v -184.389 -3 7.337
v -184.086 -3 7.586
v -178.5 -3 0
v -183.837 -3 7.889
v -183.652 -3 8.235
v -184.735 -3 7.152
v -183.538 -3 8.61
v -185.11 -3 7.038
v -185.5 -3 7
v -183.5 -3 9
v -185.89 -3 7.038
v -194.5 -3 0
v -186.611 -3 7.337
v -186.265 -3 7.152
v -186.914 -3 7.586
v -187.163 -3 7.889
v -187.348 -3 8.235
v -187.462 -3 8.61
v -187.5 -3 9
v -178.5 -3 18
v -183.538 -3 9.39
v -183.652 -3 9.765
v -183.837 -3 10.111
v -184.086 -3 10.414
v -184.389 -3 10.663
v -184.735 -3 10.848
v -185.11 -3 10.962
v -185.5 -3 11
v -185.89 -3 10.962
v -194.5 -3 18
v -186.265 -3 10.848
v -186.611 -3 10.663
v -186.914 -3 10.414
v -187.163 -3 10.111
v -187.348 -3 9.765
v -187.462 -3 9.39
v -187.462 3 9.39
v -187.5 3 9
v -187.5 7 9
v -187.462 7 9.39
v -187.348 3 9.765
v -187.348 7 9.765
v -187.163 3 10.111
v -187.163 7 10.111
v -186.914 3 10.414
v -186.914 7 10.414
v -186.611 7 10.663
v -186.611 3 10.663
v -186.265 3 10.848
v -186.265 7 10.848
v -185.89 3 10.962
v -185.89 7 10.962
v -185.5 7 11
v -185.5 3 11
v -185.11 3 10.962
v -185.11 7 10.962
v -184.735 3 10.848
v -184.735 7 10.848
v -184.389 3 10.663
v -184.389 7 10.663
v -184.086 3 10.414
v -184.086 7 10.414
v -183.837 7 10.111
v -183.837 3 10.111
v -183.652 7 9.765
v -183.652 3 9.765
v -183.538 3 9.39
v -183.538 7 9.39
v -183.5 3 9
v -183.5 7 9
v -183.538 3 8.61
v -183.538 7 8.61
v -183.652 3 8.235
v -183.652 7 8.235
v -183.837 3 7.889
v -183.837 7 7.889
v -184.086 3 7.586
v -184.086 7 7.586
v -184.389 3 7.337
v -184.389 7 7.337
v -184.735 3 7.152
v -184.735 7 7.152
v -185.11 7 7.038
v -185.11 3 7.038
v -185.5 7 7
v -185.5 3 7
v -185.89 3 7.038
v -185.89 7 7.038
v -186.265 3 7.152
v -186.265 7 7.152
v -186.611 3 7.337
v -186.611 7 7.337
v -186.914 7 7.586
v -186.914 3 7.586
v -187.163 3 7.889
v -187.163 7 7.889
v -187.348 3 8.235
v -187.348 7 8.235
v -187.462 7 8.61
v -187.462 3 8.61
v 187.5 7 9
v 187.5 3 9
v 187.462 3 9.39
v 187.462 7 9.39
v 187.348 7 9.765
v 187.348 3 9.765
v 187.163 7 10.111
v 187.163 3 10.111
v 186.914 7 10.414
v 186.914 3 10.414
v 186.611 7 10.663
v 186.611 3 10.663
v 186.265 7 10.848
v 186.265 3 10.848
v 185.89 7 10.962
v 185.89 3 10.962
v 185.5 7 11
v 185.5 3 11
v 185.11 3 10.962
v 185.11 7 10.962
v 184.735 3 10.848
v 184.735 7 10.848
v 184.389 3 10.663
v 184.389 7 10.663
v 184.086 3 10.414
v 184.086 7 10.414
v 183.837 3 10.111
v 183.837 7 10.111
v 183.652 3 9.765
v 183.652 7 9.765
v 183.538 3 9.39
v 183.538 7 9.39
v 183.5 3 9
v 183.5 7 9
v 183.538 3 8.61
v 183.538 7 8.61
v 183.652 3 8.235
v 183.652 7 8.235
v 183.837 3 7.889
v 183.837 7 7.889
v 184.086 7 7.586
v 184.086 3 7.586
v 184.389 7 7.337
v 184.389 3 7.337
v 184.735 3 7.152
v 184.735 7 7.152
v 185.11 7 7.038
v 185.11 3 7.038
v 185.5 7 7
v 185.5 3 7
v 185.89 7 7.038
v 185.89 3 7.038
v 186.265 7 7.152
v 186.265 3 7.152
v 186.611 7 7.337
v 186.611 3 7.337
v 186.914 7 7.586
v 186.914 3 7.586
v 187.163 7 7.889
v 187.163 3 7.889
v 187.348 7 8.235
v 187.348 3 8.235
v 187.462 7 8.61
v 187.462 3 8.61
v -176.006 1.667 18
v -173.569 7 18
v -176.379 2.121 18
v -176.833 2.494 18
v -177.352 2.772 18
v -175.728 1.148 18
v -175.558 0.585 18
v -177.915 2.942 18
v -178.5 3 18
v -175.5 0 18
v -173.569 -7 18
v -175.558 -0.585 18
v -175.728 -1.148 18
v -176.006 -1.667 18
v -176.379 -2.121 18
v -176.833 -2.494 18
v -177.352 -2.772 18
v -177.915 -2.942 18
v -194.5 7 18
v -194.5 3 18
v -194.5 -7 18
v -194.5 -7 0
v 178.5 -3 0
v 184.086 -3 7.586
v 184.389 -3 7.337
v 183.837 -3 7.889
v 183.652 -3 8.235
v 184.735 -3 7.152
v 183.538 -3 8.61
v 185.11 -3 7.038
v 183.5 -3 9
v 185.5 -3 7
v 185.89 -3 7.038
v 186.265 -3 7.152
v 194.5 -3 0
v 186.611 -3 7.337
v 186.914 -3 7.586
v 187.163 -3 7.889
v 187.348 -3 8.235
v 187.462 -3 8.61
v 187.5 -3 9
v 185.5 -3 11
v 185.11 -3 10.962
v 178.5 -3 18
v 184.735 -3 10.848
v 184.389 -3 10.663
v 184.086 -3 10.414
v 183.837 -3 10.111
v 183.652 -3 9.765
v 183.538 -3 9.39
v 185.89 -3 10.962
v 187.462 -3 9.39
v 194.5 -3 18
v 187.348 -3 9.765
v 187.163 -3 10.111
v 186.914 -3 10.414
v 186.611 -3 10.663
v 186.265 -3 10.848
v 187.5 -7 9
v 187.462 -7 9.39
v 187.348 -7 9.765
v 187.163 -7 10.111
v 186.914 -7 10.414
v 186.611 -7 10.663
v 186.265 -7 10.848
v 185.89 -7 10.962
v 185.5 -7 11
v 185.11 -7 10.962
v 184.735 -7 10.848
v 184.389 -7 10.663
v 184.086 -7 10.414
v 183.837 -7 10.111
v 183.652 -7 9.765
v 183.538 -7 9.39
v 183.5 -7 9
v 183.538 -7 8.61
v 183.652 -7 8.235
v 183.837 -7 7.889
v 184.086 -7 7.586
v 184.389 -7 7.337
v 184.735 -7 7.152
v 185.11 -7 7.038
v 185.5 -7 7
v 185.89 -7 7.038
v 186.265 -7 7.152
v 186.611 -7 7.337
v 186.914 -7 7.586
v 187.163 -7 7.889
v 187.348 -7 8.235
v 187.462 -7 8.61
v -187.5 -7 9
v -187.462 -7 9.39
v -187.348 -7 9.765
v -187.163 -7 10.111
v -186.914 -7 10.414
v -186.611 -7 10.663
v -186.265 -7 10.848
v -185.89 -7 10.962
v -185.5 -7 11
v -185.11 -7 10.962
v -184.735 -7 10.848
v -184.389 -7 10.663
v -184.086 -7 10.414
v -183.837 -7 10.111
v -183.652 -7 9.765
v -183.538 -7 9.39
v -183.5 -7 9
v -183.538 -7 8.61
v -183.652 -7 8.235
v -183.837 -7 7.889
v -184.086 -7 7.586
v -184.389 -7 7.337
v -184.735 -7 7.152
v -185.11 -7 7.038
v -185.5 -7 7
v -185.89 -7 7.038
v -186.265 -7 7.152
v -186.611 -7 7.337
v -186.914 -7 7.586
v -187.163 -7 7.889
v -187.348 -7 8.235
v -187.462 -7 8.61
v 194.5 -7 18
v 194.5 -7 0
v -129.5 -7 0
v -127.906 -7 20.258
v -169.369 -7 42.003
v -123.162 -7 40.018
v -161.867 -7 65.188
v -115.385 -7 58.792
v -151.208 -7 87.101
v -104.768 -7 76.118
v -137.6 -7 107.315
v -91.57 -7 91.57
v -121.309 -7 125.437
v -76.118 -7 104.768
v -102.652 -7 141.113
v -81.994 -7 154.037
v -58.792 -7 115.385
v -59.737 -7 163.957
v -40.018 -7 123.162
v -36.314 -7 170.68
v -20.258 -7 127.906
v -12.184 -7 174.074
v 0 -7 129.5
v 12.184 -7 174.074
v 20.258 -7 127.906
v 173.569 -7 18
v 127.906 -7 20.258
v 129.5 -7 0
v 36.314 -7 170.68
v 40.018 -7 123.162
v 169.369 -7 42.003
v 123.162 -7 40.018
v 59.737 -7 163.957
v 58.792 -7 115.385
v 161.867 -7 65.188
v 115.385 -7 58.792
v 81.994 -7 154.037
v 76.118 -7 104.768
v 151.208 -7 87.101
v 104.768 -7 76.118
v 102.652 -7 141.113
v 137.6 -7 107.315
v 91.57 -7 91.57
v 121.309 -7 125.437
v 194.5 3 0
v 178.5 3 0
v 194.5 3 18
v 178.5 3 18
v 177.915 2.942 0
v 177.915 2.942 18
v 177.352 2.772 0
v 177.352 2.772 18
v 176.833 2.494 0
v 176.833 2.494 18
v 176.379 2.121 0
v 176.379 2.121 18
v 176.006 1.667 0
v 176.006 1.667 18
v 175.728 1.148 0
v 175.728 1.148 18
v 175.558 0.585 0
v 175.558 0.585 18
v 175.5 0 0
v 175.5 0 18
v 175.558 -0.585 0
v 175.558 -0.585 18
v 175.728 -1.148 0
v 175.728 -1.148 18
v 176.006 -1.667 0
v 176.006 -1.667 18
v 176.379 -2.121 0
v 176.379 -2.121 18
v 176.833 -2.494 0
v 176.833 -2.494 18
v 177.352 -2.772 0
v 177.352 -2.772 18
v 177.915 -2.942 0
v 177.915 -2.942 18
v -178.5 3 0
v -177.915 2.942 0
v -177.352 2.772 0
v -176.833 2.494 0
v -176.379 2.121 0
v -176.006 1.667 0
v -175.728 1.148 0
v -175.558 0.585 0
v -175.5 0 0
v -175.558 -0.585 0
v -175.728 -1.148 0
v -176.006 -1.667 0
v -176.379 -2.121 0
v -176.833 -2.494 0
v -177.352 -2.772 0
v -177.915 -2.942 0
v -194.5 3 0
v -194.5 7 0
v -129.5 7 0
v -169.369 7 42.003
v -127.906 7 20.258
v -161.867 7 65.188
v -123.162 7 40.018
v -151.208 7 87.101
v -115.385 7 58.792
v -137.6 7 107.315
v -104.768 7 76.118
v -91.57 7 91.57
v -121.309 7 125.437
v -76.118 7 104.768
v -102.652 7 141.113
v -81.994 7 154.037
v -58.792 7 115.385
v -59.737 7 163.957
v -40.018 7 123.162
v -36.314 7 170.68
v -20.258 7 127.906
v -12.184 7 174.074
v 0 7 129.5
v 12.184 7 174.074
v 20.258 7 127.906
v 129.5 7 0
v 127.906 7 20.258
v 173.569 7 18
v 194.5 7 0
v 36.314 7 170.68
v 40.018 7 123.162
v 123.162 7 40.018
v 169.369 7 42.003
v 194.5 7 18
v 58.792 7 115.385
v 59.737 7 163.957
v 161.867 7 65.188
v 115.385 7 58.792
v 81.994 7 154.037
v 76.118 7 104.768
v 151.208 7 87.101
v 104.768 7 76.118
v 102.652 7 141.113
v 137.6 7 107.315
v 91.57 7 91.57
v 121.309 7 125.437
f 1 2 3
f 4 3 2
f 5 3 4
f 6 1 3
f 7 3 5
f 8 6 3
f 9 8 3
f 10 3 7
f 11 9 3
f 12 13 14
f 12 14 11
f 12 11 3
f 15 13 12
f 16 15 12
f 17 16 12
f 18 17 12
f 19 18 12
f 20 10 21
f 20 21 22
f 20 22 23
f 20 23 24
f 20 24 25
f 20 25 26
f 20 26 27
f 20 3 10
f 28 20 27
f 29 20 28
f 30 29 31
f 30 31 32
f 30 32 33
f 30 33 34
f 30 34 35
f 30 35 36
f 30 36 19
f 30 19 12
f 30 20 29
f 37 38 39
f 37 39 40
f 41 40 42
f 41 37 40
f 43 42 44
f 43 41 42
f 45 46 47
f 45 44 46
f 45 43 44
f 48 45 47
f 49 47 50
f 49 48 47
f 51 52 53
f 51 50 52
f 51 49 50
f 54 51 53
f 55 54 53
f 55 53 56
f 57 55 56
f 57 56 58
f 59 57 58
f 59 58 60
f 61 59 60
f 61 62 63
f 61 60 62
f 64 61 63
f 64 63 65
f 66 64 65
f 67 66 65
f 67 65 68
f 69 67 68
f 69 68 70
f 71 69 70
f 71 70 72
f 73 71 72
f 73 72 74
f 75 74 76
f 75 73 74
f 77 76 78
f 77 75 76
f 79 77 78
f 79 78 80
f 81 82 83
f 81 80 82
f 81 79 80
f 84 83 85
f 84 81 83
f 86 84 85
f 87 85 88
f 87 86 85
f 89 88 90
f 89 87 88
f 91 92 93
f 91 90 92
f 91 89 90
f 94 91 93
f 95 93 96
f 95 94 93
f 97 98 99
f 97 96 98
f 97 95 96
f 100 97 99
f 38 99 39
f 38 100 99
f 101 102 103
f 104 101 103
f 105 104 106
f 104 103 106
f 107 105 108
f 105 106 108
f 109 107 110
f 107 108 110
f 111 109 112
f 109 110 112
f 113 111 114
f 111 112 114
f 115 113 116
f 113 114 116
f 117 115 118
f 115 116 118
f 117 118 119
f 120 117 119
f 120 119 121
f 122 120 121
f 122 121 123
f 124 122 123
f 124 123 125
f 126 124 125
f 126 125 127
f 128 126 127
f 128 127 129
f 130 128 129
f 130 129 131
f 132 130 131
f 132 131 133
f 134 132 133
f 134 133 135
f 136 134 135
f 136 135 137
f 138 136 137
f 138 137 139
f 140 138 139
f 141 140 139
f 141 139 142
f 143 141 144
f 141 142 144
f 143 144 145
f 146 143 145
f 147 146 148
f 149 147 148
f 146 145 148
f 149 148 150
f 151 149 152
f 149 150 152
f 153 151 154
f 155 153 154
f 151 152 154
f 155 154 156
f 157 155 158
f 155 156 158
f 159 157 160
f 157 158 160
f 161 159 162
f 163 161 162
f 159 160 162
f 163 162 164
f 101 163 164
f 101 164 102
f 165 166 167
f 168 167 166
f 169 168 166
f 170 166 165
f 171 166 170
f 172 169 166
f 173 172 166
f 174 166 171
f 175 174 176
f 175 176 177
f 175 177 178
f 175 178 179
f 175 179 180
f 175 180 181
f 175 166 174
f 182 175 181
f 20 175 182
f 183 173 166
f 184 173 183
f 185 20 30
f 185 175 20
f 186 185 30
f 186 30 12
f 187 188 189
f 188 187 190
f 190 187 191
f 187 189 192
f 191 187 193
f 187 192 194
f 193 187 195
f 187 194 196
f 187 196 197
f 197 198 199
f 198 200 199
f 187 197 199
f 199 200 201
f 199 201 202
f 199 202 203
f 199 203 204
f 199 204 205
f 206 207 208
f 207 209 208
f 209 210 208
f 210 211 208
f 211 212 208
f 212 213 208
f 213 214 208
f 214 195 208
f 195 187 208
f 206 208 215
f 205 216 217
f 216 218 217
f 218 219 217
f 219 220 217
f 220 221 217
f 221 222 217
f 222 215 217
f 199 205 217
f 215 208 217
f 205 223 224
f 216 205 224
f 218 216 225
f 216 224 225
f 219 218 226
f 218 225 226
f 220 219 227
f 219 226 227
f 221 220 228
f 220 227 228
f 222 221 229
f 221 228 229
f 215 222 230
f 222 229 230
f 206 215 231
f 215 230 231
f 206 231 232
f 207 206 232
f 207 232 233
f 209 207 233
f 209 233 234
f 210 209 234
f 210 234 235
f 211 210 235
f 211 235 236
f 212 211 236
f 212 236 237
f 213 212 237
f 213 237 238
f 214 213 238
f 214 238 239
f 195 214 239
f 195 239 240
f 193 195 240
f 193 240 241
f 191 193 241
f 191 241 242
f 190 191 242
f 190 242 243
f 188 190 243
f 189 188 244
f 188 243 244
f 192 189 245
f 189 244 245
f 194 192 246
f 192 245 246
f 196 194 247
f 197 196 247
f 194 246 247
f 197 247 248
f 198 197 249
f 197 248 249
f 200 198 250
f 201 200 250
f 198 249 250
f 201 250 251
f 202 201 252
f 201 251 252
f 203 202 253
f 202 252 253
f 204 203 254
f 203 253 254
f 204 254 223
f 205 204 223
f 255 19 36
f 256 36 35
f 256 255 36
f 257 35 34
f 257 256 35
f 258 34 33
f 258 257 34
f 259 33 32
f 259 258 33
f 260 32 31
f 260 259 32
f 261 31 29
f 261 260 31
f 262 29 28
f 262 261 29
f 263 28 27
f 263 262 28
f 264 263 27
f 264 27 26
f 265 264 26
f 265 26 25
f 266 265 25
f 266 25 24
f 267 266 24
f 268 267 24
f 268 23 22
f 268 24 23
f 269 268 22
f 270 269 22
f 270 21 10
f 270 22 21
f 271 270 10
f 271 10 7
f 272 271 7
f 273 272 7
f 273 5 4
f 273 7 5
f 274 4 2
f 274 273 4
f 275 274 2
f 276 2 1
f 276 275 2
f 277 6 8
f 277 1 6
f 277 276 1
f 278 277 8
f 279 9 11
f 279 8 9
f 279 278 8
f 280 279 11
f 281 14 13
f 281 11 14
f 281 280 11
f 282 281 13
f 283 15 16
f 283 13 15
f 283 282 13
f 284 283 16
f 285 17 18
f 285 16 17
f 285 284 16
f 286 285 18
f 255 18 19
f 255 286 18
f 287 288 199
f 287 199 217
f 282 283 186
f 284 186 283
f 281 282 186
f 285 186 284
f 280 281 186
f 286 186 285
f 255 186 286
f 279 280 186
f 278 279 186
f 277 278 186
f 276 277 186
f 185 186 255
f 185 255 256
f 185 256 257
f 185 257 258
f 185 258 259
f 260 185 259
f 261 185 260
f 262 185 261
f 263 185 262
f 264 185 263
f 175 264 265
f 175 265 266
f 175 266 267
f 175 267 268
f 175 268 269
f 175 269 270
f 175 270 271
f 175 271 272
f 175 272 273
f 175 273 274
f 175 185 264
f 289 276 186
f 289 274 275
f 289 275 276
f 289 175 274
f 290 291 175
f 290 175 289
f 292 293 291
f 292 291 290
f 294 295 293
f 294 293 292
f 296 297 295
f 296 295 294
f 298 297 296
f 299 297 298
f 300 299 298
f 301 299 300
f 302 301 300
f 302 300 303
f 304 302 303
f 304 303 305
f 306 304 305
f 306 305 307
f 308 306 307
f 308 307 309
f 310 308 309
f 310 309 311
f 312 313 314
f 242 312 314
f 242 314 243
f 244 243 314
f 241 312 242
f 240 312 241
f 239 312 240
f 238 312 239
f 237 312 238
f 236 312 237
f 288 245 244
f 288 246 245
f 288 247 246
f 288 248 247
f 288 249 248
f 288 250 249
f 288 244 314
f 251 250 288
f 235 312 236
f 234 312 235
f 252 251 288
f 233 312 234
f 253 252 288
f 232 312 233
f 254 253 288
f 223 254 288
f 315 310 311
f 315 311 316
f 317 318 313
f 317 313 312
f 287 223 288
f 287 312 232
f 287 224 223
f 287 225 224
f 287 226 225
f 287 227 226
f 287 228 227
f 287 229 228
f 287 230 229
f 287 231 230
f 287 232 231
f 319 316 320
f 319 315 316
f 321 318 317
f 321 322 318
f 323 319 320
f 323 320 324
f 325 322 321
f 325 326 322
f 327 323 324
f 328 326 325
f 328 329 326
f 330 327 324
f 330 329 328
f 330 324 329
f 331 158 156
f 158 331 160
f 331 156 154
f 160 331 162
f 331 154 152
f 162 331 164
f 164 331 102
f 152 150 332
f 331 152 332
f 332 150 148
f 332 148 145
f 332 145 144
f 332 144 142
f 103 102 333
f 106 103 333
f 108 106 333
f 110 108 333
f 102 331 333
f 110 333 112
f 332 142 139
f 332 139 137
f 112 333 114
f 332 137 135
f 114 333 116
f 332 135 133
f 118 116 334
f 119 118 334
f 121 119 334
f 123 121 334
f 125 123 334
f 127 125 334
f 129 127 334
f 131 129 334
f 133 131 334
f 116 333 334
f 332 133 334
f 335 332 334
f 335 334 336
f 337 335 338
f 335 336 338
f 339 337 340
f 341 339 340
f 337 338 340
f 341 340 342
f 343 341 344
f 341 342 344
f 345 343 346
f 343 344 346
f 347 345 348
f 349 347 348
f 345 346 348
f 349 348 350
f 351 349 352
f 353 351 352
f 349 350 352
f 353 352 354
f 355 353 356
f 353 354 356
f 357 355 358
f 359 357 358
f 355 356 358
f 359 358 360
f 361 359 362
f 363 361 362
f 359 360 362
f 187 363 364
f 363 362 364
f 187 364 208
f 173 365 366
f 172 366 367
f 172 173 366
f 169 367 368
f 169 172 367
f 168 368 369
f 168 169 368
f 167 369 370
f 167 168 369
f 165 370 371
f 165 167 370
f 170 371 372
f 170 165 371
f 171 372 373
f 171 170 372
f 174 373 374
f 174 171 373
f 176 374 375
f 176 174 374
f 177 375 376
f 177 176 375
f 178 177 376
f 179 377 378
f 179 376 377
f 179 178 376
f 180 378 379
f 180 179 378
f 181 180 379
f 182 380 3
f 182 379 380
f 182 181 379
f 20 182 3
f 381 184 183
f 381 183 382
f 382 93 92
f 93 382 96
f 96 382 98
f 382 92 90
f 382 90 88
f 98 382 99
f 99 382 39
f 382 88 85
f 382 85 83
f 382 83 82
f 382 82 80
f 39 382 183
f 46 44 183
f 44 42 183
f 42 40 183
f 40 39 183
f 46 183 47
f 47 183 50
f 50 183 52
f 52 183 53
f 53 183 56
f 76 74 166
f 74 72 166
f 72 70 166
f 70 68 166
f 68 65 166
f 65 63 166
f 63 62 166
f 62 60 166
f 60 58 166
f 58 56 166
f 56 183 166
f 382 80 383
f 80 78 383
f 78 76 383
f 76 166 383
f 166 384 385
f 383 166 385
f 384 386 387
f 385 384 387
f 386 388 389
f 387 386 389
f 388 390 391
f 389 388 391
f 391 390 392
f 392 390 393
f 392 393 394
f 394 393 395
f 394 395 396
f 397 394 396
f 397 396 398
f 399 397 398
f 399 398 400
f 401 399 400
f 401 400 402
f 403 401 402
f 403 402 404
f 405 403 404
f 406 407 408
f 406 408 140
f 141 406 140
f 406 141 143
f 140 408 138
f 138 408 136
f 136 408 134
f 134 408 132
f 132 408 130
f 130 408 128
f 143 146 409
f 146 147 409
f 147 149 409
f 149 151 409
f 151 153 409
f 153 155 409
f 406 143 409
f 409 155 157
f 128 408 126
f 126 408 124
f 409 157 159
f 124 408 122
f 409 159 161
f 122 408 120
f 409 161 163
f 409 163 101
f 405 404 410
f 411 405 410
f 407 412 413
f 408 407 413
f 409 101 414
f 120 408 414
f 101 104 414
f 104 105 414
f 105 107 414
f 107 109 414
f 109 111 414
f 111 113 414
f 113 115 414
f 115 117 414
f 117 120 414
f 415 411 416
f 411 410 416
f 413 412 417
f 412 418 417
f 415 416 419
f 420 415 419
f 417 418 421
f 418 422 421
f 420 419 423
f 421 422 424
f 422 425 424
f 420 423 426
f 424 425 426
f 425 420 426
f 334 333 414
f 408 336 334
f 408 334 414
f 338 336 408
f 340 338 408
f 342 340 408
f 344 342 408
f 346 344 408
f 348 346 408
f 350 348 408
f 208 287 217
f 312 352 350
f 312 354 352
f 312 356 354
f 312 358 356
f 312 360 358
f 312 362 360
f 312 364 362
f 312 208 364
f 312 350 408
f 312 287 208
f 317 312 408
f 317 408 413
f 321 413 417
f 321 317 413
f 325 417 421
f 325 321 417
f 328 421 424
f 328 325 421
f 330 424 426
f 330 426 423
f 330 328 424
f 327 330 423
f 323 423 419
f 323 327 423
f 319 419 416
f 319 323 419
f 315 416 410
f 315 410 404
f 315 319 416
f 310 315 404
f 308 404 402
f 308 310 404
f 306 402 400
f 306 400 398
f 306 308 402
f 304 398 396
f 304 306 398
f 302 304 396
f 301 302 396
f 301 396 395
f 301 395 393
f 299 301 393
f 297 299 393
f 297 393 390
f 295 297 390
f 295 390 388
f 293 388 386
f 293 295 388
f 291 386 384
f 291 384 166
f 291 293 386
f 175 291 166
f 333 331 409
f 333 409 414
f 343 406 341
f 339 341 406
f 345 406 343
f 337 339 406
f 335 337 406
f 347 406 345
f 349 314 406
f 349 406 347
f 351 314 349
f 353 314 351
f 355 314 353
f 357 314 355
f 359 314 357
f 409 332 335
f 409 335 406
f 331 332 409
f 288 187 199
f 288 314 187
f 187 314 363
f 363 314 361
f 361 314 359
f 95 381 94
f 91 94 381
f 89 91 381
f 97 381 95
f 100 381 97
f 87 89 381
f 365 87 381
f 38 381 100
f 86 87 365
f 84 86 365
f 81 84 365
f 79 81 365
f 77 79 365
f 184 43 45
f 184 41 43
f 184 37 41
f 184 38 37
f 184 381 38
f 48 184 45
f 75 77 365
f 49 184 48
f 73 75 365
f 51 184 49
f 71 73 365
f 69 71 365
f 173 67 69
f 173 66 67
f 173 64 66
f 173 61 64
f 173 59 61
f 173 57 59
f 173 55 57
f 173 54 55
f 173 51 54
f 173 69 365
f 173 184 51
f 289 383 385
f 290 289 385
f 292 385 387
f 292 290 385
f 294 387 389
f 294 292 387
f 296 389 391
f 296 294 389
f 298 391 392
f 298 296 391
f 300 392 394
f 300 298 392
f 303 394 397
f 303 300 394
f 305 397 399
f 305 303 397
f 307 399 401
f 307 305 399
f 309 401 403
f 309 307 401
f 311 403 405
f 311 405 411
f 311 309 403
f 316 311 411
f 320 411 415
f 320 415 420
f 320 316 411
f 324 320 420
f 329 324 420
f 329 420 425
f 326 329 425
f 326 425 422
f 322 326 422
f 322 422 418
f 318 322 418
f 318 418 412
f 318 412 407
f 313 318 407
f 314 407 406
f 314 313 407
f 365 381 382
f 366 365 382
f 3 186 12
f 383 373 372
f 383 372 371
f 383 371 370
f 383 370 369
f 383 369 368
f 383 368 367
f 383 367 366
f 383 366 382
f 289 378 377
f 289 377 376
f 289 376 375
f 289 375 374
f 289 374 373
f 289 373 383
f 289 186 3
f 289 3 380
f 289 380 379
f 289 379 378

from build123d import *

# Parameters (mm, degrees)
F1_DEPTH = 7
F2_DEPTH = 6
F3_R     = 2
F4_DEPTH = 25
F6_DEPTH = 25


# Not quite as in the source:
# - a pattern or mirror of a feature is missing from the dataset's text; its kind, count and spacing are read off the source's solid


with BuildPart() as f1:
    # F0 (on Front) → F1 (new body, symmetric)
    with BuildSketch(Plane.XZ):
        with BuildLine():
            Line((129.5, 0), (174.5, 0))
            ThreePointArc((174.5, 0), (174.2671322418, 9.0120264206), (173.5691504848, 18))
            ThreePointArc((173.5691504848, 18), (0, 174.5), (-173.5691504848, 18))
            ThreePointArc((-173.5691504848, 18), (-174.2671322418, 9.0120264206), (-174.5, 0))
            Line((-174.5, 0), (-129.5, 0))
            ThreePointArc((-129.5, 0), (0, 129.5), (129.5, 0))
        make_face()
        with BuildLine():
            ThreePointArc((173.5691504848, 18), (174.2671322418, 9.0120264206), (174.5, 0))
            Line((174.5, 0), (194.5, 0))
            Line((194.5, 0), (194.5, 18))
            Line((194.5, 18), (173.5691504848, 18))
        make_face()
        with BuildLine():
            ThreePointArc((-174.5, 0), (-174.2671322418, 9.0120264206), (-173.5691504848, 18))
            Line((-173.5691504848, 18), (-194.5, 18))
            Line((-194.5, 18), (-194.5, 0))
            Line((-194.5, 0), (-174.5, 0))
        make_face()
    extrude(amount=F1_DEPTH, both=True)

    # F0 (on Front) → F2 (join, symmetric)
    with BuildSketch(Plane.XZ):
        with BuildLine():
            Line((129.5, 0), (174.5, 0))
            ThreePointArc((174.5, 0), (174.2671322418, 9.0120264206), (173.5691504848, 18))
            ThreePointArc((173.5691504848, 18), (0, 174.5), (-173.5691504848, 18))
            ThreePointArc((-173.5691504848, 18), (-174.2671322418, 9.0120264206), (-174.5, 0))
            Line((-174.5, 0), (-129.5, 0))
            ThreePointArc((-129.5, 0), (0, 129.5), (129.5, 0))
        make_face()
        with BuildLine():
            ThreePointArc((173.5691504848, 18), (174.2671322418, 9.0120264206), (174.5, 0))
            Line((174.5, 0), (194.5, 0))
            Line((194.5, 0), (194.5, 18))
            Line((194.5, 18), (173.5691504848, 18))
        make_face()
        with BuildLine():
            ThreePointArc((-174.5, 0), (-174.2671322418, 9.0120264206), (-173.5691504848, 18))
            Line((-173.5691504848, 18), (-194.5, 18))
            Line((-194.5, 18), (-194.5, 0))
            Line((-194.5, 0), (-174.5, 0))
        make_face()
    extrude(amount=F2_DEPTH, both=True)

    # F3 (on face) → F4 (cut)
    with BuildSketch(Plane.XZ.offset(7)):
        with Locations((185.5, 9)):
            Circle(F3_R)
    f4 = extrude(amount=-F4_DEPTH, mode=Mode.SUBTRACT)

    # F4_copies: F4 across plane
    add(f4.mirror(Plane(origin=(0, 0, 0), x_dir=(0, 0, -1), z_dir=(-1, 0, 0))), mode=Mode.SUBTRACT)

    # F5 (on face) → F6 (cut)
    with BuildSketch(Plane.XY.offset(18)):
        with BuildLine():
            Line((194.5, 3), (178.5, 3))
            ThreePointArc((178.5, 3), (175.5, 0), (178.5, -3))
            Line((178.5, -3), (194.5, -3))
            Line((194.5, -3), (194.5, 3))
        make_face()
    f6 = extrude(amount=-F6_DEPTH, mode=Mode.SUBTRACT)

    # F6_copies: F6 across plane
    add(f6.mirror(Plane(origin=(0, 0, 0), x_dir=(0, 0, -1), z_dir=(-1, 0, 0))), mode=Mode.SUBTRACT)


solid = f1.part
